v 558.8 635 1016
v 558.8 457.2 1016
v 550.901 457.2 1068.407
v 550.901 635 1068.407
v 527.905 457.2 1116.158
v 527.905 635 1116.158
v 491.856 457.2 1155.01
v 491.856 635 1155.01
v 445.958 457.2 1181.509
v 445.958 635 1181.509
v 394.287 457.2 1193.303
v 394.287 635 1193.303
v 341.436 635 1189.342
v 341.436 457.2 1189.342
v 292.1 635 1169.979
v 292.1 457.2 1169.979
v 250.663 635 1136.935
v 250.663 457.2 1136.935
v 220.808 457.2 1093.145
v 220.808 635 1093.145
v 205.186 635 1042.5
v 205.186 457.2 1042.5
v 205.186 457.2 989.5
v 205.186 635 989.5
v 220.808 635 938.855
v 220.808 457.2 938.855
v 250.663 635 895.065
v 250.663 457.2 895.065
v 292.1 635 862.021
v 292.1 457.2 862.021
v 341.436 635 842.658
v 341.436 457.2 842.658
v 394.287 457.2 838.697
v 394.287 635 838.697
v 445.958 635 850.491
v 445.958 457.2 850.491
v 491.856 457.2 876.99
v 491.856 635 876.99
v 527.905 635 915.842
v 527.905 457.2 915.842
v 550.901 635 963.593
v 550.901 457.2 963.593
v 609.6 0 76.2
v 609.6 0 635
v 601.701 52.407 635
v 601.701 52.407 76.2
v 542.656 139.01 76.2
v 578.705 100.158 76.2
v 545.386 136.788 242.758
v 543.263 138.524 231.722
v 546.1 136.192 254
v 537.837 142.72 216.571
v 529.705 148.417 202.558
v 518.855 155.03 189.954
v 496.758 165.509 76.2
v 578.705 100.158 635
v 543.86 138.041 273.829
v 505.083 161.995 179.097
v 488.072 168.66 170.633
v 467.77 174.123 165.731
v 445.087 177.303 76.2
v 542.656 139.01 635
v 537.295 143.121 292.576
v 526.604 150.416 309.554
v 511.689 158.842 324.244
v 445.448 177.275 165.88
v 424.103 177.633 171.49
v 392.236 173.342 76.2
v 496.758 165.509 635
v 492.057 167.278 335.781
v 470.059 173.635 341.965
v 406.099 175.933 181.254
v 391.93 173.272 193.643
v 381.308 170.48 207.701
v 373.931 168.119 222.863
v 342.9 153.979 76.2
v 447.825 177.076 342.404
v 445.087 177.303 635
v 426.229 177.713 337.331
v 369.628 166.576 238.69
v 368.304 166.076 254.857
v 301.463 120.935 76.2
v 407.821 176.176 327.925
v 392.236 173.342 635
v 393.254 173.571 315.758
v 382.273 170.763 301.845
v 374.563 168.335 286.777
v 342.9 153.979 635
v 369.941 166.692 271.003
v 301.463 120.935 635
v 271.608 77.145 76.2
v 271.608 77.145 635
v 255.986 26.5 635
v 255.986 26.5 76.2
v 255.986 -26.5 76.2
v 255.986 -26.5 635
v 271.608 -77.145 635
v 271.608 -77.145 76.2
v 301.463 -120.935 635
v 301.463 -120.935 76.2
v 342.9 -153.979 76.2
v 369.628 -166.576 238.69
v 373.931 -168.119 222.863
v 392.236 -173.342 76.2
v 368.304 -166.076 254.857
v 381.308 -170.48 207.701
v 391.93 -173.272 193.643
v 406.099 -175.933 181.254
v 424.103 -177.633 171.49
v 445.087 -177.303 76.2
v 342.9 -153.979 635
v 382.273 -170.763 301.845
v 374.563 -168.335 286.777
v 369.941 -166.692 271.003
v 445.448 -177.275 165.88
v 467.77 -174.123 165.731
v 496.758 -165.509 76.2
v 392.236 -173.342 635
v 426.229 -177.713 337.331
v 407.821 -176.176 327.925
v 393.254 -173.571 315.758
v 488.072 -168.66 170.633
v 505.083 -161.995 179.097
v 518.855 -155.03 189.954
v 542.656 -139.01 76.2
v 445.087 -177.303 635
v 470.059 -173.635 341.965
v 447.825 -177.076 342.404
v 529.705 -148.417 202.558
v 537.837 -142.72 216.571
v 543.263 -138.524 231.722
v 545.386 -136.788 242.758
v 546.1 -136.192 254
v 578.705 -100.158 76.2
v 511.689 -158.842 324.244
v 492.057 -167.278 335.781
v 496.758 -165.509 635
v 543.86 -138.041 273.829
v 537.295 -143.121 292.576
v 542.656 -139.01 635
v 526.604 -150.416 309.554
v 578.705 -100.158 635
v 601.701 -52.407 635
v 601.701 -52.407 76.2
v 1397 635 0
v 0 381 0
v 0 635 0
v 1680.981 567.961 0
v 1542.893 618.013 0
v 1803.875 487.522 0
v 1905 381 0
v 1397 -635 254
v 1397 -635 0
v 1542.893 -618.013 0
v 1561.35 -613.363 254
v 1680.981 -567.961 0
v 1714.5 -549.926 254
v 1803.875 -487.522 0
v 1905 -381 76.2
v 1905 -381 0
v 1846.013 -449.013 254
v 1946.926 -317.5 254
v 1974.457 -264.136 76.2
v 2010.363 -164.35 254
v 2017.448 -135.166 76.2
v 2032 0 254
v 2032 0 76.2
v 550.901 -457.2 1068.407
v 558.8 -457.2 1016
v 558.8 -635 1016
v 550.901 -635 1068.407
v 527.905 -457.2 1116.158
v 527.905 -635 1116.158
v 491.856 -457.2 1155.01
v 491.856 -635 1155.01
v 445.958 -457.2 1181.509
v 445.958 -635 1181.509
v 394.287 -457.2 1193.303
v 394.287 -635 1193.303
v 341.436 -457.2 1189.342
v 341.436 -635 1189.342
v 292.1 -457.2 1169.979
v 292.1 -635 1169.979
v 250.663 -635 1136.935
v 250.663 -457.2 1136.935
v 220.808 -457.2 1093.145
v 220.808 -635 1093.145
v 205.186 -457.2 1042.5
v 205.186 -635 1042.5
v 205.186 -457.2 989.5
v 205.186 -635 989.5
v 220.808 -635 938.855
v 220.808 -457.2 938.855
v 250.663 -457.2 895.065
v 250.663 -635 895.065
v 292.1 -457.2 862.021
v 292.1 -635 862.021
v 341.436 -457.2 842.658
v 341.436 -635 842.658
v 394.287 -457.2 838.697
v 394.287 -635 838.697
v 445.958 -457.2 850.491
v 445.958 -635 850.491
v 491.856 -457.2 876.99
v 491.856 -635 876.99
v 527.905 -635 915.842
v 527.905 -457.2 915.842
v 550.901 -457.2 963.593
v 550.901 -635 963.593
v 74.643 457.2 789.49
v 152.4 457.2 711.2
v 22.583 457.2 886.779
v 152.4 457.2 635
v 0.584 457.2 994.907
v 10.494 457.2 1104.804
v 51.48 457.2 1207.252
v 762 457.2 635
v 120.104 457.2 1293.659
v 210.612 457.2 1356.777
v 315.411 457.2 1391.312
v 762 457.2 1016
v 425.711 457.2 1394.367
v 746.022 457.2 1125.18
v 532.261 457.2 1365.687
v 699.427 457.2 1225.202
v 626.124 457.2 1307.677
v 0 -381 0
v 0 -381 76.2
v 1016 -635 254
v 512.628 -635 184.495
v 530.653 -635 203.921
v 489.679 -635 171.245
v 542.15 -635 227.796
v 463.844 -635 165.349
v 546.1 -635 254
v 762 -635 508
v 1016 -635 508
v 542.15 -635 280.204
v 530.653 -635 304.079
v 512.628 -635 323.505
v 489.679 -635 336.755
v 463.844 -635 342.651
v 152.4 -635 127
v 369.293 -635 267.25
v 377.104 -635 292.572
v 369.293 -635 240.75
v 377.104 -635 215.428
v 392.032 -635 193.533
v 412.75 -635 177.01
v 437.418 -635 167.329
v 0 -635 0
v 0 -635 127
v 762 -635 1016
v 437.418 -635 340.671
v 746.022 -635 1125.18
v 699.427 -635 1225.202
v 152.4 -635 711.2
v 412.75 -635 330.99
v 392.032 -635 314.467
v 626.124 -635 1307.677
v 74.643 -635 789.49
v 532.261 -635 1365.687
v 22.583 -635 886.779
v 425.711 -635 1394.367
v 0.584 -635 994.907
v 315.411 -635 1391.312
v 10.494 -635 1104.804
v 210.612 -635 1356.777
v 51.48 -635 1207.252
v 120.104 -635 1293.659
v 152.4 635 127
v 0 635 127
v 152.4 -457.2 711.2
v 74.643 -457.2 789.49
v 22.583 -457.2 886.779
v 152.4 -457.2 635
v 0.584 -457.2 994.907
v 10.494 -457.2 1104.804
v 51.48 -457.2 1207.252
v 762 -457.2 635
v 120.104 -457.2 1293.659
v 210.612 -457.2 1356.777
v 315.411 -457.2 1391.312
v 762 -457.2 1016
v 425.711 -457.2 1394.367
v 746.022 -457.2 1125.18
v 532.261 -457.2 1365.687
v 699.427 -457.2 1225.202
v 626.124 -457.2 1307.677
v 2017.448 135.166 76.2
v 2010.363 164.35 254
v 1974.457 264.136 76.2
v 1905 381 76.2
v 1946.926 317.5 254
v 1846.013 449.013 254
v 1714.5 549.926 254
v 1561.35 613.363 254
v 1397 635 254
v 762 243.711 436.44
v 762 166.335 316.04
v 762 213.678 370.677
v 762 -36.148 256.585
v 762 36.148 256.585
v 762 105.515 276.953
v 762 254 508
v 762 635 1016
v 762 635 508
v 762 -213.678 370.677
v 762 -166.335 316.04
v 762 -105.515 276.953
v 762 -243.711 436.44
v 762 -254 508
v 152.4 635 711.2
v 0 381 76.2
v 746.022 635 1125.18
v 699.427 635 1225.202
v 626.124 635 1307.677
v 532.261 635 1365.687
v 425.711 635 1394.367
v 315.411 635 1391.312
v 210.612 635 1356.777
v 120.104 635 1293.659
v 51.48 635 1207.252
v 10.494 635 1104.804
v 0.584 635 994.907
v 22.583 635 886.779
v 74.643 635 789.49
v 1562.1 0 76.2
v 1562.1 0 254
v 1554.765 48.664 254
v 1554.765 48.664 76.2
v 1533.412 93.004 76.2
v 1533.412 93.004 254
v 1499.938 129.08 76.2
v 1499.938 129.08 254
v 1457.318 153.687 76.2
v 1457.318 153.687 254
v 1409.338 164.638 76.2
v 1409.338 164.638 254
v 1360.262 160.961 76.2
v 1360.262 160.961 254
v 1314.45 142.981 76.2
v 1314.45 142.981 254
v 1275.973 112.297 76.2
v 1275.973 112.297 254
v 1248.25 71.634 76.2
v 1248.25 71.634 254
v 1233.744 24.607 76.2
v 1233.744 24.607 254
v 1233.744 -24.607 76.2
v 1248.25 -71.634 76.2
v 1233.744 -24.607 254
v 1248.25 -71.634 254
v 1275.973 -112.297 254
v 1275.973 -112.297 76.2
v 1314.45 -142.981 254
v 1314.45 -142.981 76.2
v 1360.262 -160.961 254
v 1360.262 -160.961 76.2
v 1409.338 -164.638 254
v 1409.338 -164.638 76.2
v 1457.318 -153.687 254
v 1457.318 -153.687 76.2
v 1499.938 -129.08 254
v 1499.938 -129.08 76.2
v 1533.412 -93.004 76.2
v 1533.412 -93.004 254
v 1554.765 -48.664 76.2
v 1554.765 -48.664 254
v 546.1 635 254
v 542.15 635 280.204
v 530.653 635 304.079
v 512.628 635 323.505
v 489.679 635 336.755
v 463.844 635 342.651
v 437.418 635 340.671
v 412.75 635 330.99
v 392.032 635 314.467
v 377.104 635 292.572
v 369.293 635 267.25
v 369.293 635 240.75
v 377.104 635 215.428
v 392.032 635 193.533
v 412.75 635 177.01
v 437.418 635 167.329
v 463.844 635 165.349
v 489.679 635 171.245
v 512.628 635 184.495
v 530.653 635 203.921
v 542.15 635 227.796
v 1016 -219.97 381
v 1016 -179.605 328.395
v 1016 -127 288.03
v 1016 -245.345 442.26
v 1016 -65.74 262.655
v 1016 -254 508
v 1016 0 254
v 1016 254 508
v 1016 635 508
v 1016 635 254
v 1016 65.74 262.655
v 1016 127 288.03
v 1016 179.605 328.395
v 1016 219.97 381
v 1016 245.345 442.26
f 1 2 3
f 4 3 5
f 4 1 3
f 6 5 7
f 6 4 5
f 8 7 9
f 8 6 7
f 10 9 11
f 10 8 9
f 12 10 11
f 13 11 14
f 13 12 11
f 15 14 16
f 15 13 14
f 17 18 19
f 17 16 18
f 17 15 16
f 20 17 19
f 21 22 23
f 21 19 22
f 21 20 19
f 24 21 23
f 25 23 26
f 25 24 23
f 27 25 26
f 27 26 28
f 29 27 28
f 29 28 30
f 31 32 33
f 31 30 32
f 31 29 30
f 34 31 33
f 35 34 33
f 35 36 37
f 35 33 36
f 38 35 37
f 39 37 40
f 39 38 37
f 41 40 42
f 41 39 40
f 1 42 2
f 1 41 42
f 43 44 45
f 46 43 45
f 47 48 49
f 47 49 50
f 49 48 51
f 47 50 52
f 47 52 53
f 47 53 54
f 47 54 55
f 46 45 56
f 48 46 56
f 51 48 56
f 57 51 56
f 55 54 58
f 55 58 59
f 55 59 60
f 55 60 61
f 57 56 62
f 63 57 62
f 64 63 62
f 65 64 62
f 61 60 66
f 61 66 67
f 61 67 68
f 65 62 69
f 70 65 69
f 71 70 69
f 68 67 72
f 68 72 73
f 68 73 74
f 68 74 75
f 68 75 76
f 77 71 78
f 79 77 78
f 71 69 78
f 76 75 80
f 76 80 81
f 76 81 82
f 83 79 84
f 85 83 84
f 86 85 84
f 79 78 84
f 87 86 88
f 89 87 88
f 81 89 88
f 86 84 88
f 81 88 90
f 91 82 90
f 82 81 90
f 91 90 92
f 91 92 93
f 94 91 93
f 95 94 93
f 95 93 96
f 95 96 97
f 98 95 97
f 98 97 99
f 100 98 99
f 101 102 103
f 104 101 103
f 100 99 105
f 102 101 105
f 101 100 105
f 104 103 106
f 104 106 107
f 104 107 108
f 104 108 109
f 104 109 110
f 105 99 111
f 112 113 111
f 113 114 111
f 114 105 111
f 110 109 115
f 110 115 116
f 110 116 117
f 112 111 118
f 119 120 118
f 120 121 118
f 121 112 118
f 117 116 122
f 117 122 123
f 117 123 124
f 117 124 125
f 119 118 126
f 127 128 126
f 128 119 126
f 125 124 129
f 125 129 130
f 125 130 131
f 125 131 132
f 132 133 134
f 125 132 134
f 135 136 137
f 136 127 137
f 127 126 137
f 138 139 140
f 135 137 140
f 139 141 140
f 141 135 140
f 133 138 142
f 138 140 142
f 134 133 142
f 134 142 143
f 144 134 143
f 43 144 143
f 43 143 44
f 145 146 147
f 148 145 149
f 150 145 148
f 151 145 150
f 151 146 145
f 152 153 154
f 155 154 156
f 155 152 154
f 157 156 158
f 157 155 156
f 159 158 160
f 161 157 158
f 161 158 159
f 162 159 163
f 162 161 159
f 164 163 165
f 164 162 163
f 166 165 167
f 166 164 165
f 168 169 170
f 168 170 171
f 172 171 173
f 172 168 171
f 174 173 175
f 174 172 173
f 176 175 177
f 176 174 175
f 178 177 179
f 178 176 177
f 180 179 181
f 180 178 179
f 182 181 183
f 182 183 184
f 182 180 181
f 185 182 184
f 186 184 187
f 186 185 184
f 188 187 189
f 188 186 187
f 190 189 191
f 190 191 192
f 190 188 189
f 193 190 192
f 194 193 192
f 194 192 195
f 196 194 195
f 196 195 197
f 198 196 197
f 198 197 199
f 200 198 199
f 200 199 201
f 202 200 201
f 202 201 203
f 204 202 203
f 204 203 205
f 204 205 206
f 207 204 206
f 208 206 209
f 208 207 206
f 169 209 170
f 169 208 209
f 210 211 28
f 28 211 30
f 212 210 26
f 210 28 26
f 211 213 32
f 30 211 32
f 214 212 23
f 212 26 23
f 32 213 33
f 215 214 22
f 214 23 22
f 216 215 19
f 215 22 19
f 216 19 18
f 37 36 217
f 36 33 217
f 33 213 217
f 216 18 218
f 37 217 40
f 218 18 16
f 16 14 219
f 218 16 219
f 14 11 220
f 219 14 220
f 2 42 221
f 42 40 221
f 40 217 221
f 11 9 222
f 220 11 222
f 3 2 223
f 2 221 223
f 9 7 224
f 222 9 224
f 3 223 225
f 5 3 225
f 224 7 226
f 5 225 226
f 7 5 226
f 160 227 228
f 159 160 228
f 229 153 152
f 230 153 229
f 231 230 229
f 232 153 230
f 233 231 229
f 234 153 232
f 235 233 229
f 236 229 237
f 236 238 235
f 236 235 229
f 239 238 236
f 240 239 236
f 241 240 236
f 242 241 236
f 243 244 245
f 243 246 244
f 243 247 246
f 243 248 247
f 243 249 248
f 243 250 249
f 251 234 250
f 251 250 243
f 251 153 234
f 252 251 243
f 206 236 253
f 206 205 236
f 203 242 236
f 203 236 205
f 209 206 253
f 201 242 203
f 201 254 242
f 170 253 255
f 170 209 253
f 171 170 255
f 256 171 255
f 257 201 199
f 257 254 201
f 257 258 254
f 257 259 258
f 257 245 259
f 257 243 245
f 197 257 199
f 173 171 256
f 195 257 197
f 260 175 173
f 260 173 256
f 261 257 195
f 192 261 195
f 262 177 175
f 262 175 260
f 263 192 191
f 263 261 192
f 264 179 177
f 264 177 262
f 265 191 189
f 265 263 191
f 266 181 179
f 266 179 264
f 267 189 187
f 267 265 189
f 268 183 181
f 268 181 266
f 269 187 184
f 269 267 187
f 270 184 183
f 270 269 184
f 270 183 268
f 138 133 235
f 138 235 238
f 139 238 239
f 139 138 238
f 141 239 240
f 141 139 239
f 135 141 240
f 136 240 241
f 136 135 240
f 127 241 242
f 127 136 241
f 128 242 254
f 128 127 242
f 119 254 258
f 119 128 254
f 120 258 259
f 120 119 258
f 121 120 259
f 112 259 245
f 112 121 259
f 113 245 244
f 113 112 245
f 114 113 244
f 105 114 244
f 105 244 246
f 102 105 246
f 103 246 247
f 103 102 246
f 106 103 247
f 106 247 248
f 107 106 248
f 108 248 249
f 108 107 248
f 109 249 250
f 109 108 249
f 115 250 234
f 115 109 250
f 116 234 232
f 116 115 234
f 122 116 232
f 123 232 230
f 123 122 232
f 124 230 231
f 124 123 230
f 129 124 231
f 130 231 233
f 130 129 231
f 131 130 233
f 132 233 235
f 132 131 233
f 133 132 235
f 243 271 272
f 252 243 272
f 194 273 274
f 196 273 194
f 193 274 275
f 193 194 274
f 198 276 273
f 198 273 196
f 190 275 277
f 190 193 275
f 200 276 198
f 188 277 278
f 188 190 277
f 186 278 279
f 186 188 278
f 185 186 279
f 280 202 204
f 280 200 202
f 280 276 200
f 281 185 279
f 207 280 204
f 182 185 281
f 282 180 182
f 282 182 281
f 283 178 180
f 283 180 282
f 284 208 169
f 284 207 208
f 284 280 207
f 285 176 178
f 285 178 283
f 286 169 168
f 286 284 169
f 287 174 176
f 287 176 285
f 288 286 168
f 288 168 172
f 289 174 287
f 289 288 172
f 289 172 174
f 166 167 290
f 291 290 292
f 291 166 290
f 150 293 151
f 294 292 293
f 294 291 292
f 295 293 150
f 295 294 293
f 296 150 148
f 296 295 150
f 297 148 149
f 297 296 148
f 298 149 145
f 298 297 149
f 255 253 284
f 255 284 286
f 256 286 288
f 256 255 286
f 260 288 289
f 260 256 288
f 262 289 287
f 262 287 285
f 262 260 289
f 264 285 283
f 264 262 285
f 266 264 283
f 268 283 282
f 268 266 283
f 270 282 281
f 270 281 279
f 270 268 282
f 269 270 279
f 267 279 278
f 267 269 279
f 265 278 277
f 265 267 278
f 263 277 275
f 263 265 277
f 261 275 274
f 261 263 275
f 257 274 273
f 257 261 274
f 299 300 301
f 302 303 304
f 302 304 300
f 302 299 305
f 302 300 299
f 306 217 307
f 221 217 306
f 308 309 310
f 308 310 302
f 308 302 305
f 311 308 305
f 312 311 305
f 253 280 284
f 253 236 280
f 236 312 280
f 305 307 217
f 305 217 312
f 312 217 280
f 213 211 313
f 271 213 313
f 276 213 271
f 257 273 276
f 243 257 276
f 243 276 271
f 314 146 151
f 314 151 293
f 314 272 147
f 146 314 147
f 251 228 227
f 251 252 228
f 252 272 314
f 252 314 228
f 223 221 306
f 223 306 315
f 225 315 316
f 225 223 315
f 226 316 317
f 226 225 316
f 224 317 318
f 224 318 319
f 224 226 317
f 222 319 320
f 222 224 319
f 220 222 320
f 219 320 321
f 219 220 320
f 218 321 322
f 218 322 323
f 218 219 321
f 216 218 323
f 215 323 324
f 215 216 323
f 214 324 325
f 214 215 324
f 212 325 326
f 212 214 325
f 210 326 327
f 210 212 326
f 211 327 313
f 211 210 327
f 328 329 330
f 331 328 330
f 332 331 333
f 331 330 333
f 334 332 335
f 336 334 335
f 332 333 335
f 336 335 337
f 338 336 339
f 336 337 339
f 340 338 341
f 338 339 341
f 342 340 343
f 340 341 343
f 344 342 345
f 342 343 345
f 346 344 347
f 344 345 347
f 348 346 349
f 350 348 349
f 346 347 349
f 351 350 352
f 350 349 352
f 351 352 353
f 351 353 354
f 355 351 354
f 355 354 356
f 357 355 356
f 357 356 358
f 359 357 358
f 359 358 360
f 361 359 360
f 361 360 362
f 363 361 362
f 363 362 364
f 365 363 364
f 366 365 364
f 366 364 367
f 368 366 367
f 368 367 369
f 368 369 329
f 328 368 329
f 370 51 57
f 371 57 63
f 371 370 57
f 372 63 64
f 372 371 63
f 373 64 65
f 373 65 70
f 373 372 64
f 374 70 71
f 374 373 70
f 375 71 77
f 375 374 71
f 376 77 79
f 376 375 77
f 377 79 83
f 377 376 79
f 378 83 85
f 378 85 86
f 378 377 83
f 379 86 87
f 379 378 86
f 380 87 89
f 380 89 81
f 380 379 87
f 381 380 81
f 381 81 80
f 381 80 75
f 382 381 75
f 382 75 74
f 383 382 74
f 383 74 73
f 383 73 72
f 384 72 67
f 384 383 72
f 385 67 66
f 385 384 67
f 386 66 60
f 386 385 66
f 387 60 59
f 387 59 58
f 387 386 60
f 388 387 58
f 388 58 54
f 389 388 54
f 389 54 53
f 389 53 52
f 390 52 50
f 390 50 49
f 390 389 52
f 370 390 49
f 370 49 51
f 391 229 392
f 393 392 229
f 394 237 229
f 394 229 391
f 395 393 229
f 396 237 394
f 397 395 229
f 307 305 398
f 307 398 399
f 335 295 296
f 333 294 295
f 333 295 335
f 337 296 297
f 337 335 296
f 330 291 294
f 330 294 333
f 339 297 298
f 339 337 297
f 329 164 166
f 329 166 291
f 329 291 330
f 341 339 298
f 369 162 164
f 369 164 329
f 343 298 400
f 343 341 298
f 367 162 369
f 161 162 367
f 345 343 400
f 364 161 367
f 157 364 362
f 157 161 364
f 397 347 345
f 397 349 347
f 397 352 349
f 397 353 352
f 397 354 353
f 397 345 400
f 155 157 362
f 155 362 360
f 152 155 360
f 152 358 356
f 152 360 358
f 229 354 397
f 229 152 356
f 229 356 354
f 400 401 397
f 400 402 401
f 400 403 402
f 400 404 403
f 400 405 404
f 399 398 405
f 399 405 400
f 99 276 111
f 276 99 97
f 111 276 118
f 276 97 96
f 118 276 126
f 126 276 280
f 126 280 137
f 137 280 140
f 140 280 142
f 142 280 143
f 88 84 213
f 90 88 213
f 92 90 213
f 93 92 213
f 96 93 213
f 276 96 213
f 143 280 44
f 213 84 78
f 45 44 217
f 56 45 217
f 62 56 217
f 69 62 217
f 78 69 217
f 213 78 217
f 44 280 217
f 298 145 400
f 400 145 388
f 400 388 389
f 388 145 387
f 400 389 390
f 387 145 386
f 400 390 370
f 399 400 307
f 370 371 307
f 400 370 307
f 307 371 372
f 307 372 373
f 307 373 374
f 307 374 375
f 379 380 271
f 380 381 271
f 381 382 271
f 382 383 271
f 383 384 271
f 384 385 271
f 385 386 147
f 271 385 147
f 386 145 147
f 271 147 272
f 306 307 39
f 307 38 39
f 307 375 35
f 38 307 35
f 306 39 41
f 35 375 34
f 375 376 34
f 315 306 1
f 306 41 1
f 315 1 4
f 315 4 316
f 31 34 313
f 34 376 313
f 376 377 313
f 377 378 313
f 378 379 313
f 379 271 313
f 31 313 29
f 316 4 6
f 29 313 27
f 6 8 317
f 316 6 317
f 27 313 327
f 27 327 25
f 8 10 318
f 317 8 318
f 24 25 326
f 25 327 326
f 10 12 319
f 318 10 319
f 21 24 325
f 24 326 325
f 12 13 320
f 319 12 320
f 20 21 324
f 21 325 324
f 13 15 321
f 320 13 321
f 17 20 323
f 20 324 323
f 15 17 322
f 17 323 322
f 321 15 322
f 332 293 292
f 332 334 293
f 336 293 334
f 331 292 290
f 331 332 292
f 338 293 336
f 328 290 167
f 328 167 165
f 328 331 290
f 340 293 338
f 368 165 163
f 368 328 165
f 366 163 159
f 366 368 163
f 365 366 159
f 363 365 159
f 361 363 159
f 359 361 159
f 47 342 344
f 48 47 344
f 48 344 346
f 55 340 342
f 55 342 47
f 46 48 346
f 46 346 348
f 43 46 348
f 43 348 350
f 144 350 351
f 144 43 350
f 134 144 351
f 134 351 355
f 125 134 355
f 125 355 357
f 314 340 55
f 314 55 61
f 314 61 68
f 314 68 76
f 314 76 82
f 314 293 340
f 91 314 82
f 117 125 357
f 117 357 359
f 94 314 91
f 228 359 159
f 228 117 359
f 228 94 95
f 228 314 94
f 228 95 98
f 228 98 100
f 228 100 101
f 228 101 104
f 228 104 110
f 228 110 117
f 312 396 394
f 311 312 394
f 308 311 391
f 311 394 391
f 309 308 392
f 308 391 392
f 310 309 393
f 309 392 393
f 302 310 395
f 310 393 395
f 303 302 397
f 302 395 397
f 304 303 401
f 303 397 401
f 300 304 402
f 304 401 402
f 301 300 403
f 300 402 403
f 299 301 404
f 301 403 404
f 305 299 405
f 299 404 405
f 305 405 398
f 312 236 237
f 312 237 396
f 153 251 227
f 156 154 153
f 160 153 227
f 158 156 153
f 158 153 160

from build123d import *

# Parameters (mm, degrees)
F0_R      = 88.9
F0_R_2    = 177.8
F1_DEPTH  = 635
F3_DEPTH  = 254
F4_R      = 165.1
F5_DEPTH  = 254.001
F6_W      = 914.4
F6_H      = 889
F7_DEPTH  = 762.001
F8_R      = 177.8
F9_DEPTH  = 635.001
F10_W     = 762
F10_H     = 76.2
F11_DEPTH = 2032.001
F12_W     = 1270
F12_H     = 254
F13_DEPTH = 254
F15_DEPTH = 254


with BuildPart() as f1:
    # F0 (on Front) → F1 (new body, symmetric)
    with BuildSketch(Plane.XZ):
        with BuildLine():
            Line((0, 127), (0, 0))
            Line((0, 0), (1397, 0))
            Line((1397, 0), (1397, 254))
            Line((1397, 254), (762, 254))
            Line((762, 254), (762, 1016))
            ThreePointArc((762, 1016), (210.61162, 1356.77676), (152.4, 711.2))
            Line((152.4, 711.2), (152.4, 127))
            Line((152.4, 127), (0, 127))
        make_face()
        with Locations((457.2, 254)):
            Circle(F0_R, mode=Mode.SUBTRACT)
        with Locations((381, 1016)):
            Circle(F0_R_2, mode=Mode.SUBTRACT)
    extrude(amount=F1_DEPTH, both=True)

    # F2 (on face) → F3 (join)
    with BuildSketch(Plane.XY.offset(254)):
        with BuildLine():
            ThreePointArc((1397, 635), (762, 0), (1397, -635))
            Line((1397, -635), (1397, 635))
        make_face()
        with BuildLine():
            Line((1397, 635), (1397, -635))
            ThreePointArc((1397, -635), (1846.012806, -449.012806), (2032, 0))
            ThreePointArc((2032, 0), (1846.012806, 449.012806), (1397, 635))
        make_face()
    extrude(amount=-F3_DEPTH)

    # F4 (on face) → F5 (cut, through all)
    with BuildSketch(Plane.XY.offset(254)):
        with Locations((1397, 0)):
            Circle(F4_R)
    extrude(amount=-F5_DEPTH, mode=Mode.SUBTRACT)

    # F6 (on face) → F7 (cut, through all)
    with BuildSketch(Plane.YZ.offset(762)):
        with Locations((0, 1079.5)):
            Rectangle(F6_W, F6_H)
    extrude(amount=-F7_DEPTH, mode=Mode.SUBTRACT)

    # F8 (on face) → F9 (cut, through all)
    with BuildSketch(Plane.XY.offset(635)):
        with Locations((431.8, 0)):
            Circle(F8_R)
    extrude(amount=-F9_DEPTH, mode=Mode.SUBTRACT)

    # F10 (on face) → F11 (cut, through all)
    with BuildSketch(Plane(origin=(0, 0, 0), x_dir=(0, -1, 0), z_dir=(-1, 0, 0))):
        with Locations((0, 38.1)):
            Rectangle(F10_W, F10_H)
    extrude(amount=-F11_DEPTH, mode=Mode.SUBTRACT)

    # F12 (on face) → F13 (join)
    with BuildSketch(Plane.YZ.offset(762)):
        with Locations((0, 381)):
            Rectangle(F12_W, F12_H)
    extrude(amount=F13_DEPTH)

    # F14 (on face) → F15 (cut)
    with BuildSketch(Plane.YZ.offset(1016)):
        with BuildLine():
            ThreePointArc((254, 508), (0, 762), (-254, 508))
            Line((-254, 508), (254, 508))
        make_face()
        with BuildLine():
            Line((254, 508), (-254, 508))
            ThreePointArc((-254, 508), (0, 254), (254, 508))
        make_face()
    extrude(amount=-F15_DEPTH, mode=Mode.SUBTRACT)


solid = f1.part
